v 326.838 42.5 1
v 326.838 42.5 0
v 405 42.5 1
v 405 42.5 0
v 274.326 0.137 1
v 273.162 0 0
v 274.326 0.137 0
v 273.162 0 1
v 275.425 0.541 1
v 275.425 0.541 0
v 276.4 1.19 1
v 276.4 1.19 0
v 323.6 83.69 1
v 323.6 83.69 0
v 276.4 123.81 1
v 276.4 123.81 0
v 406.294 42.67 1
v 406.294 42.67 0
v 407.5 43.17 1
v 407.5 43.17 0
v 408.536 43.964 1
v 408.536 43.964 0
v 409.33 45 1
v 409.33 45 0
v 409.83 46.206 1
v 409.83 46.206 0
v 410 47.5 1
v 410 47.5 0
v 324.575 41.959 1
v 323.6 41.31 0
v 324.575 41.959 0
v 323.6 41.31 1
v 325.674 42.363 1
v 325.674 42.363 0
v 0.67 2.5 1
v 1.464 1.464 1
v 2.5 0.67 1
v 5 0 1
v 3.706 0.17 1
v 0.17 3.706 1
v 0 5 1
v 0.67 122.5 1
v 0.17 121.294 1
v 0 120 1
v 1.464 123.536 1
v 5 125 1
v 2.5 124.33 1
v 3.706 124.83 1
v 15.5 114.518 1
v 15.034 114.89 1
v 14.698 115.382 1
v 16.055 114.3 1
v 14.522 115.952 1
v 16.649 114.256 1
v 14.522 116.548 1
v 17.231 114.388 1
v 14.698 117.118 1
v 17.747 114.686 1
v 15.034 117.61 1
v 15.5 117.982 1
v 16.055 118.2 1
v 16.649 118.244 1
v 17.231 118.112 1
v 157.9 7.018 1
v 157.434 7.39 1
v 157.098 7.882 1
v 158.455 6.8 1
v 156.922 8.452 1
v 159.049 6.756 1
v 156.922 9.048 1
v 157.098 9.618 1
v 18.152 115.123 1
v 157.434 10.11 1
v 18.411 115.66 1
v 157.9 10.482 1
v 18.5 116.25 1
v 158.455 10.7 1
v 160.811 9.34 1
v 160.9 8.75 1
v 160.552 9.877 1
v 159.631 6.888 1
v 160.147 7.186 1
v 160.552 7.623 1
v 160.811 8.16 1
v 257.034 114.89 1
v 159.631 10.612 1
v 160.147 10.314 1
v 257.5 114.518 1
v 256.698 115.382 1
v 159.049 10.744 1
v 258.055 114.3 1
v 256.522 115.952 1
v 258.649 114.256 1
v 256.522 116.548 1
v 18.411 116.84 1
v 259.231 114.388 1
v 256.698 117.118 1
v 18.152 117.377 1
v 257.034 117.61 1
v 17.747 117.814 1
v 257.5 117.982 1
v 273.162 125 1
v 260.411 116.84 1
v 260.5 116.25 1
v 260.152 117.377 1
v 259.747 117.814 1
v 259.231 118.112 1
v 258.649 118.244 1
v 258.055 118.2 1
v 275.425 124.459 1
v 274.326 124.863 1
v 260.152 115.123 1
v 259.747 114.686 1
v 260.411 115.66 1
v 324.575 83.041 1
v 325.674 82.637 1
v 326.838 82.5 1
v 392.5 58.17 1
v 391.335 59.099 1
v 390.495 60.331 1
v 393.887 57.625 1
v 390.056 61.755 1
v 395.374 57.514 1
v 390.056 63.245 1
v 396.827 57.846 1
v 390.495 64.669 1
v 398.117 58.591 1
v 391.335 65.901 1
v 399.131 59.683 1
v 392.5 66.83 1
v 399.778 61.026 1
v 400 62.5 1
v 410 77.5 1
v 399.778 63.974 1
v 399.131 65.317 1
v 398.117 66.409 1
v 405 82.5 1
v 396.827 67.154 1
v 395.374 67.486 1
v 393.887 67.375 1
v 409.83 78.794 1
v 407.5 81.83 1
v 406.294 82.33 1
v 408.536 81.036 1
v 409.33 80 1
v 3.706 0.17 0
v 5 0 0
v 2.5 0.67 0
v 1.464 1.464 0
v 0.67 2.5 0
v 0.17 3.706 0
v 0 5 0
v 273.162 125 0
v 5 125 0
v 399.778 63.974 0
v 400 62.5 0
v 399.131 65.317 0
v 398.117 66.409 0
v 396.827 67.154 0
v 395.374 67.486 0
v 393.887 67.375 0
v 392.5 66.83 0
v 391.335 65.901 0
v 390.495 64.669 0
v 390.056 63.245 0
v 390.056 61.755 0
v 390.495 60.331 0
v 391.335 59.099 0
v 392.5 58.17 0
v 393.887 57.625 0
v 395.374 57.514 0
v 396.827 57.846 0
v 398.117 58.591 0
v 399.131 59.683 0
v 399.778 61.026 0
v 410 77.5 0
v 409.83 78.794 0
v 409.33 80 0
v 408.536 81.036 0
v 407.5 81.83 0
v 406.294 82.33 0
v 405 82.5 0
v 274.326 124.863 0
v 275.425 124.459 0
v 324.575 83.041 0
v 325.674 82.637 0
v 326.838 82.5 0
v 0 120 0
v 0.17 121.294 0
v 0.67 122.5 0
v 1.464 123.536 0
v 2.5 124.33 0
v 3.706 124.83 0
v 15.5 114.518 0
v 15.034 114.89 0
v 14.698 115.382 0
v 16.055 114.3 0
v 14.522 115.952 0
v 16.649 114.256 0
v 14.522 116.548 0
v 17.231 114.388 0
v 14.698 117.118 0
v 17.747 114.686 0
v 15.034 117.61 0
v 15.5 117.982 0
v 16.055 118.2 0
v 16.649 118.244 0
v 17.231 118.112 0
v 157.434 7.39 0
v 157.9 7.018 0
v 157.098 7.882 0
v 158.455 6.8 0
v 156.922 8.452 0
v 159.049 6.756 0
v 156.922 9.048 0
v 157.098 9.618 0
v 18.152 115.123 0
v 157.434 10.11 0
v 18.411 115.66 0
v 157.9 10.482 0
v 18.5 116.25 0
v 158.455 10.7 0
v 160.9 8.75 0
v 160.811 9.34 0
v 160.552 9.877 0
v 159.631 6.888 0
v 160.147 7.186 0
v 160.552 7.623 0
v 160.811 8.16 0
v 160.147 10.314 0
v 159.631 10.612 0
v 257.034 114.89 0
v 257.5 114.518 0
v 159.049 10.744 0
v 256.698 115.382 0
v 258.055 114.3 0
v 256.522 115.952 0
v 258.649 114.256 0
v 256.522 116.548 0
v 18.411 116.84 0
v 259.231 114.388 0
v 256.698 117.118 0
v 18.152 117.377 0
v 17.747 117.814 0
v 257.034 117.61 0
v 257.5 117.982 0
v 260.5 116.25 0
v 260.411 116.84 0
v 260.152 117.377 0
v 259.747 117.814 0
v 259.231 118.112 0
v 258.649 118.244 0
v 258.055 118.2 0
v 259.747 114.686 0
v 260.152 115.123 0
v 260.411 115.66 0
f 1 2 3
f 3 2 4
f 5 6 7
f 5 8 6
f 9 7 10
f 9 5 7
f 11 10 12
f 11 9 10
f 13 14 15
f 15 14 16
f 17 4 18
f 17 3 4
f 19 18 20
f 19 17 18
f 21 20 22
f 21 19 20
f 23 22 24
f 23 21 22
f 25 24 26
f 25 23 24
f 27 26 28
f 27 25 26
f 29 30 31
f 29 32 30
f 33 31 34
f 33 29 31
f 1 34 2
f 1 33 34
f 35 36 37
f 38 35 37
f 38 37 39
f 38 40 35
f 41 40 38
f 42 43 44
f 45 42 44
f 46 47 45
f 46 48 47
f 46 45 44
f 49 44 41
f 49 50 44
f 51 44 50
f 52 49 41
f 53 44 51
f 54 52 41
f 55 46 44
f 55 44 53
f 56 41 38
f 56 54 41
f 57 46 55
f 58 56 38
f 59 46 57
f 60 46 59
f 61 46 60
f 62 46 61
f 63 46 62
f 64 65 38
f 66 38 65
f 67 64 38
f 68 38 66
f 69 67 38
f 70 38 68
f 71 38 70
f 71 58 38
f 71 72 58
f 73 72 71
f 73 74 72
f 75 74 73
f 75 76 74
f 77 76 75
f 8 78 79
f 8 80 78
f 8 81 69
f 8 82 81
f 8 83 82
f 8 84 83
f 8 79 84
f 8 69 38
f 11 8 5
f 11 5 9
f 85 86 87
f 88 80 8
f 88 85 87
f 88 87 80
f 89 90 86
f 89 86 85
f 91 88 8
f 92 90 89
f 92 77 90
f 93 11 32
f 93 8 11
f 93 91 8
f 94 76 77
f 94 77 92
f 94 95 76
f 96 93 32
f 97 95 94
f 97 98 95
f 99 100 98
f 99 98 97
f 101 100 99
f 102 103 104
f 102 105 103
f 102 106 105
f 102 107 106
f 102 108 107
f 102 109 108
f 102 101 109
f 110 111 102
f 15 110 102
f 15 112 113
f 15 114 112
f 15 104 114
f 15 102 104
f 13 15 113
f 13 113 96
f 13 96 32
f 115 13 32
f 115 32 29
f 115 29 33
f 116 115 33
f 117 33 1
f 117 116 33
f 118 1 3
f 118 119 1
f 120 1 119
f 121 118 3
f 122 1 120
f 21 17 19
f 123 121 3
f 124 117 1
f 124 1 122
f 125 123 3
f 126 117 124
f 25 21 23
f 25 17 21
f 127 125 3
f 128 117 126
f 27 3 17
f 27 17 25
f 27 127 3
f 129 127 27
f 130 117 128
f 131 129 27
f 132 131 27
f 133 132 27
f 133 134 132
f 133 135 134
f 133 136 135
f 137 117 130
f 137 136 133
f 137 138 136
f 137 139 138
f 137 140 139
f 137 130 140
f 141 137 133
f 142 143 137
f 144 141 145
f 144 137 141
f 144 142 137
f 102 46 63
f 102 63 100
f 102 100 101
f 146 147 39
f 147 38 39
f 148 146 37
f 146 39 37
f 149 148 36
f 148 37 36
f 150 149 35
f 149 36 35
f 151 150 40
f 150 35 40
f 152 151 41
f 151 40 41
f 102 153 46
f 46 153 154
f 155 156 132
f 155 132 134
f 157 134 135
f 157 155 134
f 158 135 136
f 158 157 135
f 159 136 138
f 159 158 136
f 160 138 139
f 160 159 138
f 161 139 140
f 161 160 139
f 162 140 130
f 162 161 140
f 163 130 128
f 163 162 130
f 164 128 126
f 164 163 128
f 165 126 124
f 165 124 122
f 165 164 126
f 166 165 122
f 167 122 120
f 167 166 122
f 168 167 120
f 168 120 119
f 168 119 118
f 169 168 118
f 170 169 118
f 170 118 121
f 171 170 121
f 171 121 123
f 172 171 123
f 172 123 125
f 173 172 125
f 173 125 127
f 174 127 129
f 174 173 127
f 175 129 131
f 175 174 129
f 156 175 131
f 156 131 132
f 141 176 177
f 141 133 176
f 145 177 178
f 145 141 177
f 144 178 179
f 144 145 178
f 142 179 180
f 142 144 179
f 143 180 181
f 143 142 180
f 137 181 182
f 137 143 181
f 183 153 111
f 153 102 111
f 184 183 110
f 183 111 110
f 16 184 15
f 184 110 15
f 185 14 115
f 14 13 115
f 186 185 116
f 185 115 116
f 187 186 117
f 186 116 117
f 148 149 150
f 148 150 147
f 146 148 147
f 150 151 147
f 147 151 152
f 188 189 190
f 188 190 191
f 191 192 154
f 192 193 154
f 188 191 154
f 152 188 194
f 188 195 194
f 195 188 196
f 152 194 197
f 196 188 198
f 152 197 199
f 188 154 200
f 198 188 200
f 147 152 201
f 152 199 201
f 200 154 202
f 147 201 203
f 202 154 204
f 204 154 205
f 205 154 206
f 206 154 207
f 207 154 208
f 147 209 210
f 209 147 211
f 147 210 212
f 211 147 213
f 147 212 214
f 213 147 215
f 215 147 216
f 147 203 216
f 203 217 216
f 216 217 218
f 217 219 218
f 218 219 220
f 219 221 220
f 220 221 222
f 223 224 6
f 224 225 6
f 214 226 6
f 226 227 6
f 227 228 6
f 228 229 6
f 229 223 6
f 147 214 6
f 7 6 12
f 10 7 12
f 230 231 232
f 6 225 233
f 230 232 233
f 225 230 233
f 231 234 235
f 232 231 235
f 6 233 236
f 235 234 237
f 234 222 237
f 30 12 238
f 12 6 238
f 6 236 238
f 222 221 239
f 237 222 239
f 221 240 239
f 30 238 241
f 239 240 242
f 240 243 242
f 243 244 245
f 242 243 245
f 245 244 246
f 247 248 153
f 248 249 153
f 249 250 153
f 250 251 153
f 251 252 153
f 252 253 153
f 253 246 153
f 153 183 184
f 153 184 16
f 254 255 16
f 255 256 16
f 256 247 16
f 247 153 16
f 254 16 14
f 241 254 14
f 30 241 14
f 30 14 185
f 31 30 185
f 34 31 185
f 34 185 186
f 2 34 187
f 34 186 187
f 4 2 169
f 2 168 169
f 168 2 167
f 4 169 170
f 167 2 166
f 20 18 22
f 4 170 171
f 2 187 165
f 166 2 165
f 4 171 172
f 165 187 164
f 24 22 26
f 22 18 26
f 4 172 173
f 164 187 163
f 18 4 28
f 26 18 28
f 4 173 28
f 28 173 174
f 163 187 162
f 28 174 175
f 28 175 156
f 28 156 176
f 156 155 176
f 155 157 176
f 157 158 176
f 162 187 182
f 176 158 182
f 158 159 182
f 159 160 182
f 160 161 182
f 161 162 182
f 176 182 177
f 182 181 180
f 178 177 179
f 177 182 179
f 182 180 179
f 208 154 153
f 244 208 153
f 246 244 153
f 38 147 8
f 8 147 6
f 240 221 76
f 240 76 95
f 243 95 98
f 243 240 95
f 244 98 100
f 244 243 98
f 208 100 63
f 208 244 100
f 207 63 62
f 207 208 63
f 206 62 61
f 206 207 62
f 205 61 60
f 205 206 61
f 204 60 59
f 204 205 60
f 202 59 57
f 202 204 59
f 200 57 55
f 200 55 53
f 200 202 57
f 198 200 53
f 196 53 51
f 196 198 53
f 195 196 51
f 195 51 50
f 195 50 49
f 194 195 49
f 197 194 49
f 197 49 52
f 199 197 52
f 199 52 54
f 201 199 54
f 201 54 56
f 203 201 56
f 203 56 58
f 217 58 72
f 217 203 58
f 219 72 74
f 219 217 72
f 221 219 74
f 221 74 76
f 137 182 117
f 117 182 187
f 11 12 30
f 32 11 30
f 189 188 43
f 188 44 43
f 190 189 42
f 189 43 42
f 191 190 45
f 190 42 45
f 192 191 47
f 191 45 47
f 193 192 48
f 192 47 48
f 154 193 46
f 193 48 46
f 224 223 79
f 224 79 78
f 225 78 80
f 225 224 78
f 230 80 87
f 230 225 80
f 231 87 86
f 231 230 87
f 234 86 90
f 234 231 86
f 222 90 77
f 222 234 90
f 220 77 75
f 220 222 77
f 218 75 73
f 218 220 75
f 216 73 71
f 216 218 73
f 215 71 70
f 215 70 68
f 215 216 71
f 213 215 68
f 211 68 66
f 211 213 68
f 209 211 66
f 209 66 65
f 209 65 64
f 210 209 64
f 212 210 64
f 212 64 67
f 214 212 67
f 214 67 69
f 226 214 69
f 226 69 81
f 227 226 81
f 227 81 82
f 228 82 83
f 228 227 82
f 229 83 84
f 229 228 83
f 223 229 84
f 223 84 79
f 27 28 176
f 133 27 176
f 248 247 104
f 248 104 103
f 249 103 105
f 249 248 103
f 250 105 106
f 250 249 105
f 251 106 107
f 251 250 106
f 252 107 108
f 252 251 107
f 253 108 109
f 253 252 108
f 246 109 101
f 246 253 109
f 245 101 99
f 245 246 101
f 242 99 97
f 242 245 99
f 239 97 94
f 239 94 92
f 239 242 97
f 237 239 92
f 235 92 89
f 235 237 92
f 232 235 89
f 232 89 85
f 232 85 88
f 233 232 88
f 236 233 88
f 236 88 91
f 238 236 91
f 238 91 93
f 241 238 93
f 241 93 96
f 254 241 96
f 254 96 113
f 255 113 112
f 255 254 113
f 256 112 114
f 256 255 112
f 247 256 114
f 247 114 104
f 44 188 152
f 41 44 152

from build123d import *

# Parameters (mm, degrees)
SKETCH_R   = 5
SKETCH_R_2 = 2
PAD_DEPTH  = 1
FILLET_R   = 5


with BuildPart() as part:
    # Sketch → Pad (new body)
    with BuildSketch(Plane.XY):
        Polygon((0, 0), (275, 0), (325, 42.5), (410, 42.5), (410, 82.5), (325, 82.5), (275, 125), (0, 125), align=None)
        with Locations((395, 62.5)):
            Circle(SKETCH_R, mode=Mode.SUBTRACT)
        with Locations((258.5, 116.25)):
            Circle(SKETCH_R_2, mode=Mode.SUBTRACT)
        with Locations((158.9, 8.75)):
            Circle(SKETCH_R_2, mode=Mode.SUBTRACT)
        with Locations((16.5, 116.25)):
            Circle(SKETCH_R_2, mode=Mode.SUBTRACT)
    extrude(amount=PAD_DEPTH)

    # Fillet
    fillet_edges = [part.edges().sort_by_distance(p)[0] for p in [
        (0, 0, 0.5),
        (275, 0, 0.5),
        (325, 42.5, 0.5),
        (410, 42.5, 0.5),
        (410, 82.5, 0.5),
        (325, 82.5, 0.5),
        (275, 125, 0.5),
        (0, 125, 0.5),
    ]]
    fillet(fillet_edges, radius=FILLET_R)


solid = part.part
